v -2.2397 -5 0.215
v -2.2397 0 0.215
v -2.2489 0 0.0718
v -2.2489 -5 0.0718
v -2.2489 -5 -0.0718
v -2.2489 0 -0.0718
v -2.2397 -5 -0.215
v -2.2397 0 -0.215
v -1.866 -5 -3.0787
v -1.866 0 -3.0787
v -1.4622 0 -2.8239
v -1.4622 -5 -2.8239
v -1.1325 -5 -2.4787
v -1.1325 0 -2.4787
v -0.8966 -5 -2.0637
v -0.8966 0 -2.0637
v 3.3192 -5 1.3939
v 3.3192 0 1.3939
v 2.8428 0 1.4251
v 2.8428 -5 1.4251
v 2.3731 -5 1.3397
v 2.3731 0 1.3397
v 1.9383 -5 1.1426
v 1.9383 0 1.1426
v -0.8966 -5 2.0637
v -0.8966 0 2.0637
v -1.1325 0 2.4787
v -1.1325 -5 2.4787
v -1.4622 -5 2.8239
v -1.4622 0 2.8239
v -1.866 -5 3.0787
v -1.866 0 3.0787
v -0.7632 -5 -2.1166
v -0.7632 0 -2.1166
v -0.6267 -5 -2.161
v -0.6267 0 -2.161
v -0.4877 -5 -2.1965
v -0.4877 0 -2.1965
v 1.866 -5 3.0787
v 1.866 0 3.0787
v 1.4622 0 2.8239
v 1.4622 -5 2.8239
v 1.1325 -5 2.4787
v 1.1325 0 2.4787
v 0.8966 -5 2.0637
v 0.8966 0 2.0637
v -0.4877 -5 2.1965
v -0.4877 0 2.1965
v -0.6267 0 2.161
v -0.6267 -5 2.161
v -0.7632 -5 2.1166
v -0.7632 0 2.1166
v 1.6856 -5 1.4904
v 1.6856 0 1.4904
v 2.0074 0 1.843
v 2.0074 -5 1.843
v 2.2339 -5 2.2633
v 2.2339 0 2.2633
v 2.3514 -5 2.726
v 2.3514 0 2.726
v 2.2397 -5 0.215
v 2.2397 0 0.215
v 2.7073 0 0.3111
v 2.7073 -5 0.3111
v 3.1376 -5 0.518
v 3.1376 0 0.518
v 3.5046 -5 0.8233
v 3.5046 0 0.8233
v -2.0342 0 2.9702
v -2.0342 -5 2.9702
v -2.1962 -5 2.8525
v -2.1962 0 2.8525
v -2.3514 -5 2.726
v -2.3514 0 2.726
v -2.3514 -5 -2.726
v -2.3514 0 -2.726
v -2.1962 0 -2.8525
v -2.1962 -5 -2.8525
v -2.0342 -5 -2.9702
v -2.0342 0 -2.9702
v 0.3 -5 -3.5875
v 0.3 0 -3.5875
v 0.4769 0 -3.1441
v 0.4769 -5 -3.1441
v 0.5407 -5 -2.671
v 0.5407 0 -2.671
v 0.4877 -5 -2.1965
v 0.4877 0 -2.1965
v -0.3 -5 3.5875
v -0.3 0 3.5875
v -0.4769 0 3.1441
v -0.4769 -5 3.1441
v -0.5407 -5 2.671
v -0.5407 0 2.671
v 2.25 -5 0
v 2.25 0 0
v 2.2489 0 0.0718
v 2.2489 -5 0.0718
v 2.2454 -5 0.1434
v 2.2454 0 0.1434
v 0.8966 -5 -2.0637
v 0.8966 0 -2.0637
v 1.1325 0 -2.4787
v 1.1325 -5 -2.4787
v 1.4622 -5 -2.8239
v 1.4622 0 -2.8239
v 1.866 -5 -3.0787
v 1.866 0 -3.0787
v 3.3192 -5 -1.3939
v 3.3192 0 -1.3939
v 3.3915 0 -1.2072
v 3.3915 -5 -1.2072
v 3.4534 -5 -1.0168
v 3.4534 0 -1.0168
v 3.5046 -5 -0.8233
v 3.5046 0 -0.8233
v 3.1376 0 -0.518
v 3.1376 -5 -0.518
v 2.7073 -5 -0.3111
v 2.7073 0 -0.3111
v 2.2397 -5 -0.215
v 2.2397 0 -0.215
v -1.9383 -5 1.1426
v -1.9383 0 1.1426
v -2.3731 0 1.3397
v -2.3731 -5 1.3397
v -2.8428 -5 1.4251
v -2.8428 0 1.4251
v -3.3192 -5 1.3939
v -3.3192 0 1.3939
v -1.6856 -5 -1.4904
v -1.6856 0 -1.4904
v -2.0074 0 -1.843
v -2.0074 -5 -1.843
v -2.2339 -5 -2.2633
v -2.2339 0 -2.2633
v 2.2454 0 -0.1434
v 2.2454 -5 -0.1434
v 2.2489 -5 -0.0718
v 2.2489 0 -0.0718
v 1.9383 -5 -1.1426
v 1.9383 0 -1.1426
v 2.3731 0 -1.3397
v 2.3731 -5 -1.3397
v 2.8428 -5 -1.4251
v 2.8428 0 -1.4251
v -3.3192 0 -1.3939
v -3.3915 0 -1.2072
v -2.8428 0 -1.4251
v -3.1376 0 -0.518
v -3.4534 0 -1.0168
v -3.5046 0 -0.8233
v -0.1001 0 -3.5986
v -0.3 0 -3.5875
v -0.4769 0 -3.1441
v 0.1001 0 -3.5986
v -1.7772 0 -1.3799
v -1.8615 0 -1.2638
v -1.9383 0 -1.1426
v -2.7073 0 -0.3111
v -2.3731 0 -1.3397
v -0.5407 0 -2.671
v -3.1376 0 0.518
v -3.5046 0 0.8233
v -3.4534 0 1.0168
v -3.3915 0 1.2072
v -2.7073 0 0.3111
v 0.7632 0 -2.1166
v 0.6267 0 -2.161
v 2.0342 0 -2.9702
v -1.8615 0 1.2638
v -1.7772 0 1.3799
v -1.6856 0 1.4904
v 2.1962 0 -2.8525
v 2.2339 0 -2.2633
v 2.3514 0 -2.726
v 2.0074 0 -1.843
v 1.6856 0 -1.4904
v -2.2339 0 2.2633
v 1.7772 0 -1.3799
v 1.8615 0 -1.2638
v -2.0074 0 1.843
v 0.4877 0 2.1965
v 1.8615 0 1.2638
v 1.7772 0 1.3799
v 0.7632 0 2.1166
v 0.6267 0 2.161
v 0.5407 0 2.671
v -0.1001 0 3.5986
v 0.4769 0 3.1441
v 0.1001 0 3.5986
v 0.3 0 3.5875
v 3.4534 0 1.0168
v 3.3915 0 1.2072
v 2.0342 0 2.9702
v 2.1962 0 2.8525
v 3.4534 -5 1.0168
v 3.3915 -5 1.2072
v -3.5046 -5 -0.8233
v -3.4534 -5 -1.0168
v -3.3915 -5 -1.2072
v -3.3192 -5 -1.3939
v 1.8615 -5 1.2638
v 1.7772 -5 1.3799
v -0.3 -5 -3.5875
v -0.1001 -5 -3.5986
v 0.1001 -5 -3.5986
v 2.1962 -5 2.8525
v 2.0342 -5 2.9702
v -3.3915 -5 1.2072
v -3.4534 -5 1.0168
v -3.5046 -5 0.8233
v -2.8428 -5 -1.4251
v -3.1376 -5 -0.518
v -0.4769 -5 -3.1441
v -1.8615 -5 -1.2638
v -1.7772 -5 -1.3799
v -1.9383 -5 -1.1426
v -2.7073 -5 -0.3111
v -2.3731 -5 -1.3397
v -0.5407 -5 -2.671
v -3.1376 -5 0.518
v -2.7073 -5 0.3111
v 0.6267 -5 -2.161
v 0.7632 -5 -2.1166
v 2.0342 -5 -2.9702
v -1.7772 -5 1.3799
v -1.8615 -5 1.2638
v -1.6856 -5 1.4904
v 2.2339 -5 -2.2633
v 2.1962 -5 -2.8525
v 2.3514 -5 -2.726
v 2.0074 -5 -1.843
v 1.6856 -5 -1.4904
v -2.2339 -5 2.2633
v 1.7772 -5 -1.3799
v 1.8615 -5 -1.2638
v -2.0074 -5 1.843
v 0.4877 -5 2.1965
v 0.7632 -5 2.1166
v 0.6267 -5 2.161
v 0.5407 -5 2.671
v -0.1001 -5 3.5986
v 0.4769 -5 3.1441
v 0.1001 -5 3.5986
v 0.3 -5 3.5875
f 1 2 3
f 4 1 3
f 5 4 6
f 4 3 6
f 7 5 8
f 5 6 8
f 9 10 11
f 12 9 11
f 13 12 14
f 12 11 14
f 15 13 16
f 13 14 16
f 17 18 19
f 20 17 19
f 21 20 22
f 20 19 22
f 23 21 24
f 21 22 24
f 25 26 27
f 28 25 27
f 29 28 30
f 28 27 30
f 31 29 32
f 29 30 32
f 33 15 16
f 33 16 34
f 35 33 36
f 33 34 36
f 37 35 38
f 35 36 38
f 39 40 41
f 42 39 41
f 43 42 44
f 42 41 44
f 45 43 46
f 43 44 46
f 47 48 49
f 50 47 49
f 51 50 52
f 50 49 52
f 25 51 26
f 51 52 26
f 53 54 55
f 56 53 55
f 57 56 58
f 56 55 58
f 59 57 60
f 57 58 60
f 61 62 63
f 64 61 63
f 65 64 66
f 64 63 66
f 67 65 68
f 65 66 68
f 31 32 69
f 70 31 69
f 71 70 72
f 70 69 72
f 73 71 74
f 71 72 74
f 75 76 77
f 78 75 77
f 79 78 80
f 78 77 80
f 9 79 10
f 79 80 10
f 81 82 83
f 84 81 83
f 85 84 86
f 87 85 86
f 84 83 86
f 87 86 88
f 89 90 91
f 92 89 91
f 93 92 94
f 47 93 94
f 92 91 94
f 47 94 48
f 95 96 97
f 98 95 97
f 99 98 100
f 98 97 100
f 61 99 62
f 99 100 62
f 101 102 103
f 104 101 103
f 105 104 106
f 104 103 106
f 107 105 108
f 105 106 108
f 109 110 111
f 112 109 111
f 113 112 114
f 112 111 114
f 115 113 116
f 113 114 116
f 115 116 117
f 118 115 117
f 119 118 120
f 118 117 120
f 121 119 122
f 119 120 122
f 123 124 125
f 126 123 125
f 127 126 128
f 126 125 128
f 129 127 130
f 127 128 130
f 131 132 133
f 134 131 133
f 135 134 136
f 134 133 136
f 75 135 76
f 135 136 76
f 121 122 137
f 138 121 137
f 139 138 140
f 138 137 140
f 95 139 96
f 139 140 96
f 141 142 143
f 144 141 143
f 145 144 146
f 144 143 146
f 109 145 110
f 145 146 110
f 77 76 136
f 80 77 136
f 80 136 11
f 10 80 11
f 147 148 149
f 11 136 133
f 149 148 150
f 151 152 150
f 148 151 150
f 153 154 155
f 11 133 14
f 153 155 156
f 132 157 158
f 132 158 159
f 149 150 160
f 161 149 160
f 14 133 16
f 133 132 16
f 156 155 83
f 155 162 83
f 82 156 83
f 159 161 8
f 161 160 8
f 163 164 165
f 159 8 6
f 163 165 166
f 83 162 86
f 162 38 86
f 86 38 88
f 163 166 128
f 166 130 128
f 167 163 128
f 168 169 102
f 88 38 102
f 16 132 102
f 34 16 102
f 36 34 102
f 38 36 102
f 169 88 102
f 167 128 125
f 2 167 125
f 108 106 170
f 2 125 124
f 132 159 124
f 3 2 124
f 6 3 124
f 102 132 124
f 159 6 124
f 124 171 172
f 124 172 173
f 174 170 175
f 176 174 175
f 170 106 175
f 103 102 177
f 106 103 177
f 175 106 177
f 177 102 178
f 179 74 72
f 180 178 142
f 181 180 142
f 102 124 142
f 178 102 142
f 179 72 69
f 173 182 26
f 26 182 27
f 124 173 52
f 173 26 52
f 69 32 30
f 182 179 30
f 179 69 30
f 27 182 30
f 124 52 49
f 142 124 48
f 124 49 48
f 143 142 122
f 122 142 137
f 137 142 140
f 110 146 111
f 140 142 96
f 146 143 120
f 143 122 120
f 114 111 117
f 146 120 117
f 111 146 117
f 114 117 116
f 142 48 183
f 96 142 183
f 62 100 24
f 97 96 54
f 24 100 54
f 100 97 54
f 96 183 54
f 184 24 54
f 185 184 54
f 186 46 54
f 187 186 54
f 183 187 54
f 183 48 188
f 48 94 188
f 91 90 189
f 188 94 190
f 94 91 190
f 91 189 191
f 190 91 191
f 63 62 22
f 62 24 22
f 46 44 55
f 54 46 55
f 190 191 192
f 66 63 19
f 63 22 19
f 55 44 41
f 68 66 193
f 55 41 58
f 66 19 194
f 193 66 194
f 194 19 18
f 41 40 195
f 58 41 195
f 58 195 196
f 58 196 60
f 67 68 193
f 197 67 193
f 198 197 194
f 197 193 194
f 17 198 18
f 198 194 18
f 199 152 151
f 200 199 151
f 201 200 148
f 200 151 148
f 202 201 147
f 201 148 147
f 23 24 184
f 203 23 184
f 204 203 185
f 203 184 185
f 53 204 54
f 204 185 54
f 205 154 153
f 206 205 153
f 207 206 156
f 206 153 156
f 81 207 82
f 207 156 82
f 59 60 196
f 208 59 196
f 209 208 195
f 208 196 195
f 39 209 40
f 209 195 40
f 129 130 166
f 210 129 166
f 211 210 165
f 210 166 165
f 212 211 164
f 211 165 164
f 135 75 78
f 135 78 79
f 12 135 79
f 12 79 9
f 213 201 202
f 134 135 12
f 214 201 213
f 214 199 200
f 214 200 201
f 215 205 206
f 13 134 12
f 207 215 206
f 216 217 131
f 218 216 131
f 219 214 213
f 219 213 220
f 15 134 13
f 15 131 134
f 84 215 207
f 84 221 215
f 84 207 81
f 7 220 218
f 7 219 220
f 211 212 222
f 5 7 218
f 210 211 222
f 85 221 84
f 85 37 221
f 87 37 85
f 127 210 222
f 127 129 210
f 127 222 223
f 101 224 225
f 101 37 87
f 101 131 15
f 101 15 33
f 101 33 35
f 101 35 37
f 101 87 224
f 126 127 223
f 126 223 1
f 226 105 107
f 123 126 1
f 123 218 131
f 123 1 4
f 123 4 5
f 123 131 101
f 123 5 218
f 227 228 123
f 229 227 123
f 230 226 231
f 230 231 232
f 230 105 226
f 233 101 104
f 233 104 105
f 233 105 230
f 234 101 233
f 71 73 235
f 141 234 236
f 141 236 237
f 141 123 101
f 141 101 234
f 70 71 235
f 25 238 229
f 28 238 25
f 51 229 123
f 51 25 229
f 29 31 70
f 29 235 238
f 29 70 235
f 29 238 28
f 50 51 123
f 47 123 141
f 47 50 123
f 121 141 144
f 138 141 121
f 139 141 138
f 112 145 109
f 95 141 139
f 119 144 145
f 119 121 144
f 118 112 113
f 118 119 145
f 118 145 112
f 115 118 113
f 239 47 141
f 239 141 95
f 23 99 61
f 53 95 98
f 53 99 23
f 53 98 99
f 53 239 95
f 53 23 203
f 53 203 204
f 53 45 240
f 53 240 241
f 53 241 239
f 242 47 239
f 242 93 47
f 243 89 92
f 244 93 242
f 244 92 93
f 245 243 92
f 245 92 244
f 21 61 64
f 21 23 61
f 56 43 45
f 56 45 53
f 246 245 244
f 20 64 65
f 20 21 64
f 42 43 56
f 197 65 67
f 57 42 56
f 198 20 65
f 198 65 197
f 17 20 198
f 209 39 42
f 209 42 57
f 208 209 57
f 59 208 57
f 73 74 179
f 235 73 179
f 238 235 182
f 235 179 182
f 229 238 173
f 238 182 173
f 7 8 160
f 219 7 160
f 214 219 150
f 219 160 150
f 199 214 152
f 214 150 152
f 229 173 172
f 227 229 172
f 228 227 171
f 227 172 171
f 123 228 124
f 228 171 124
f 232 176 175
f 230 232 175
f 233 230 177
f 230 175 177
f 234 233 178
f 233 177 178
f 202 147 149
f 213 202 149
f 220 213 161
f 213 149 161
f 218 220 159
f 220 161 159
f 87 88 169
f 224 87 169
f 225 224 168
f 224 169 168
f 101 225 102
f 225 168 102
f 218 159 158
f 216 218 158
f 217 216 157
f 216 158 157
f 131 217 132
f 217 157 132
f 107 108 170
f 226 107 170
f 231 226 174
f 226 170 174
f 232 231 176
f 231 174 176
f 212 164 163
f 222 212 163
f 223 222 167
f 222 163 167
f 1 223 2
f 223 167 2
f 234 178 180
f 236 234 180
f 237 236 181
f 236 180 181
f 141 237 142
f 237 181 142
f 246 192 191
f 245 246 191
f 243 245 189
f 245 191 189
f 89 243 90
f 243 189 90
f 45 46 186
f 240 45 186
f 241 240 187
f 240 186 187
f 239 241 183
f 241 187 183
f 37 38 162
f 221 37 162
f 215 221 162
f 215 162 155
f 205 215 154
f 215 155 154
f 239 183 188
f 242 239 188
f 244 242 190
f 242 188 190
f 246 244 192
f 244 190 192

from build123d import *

# Parameters (mm, degrees)
F1_DEPTH = 5
F3_DEPTH = 5


with BuildPart() as f1:
    # F0 (on Front) → F1 (new body)
    with BuildSketch(Plane.XZ):
        with BuildLine():
            ThreePointArc((-0.487665, 2.196516), (-1.408058, -1.754957), (2.25, 0))
            ThreePointArc((2.25, 0), (1.754957, 1.408058), (0.487665, 2.196516))
            ThreePointArc((0.487665, 2.196516), (0, 2.25), (-0.487665, 2.196516))
        make_face()
    extrude(amount=F1_DEPTH)

    # F2 (on Front) + F0 (on Front) → F3 (join)
    with BuildSketch(Plane.XZ):
        with BuildLine():
            ThreePointArc((-1.685609, 1.490377), (-1.322517, 1.820288), (-0.896551, 2.063661))
            ThreePointArc((-0.896551, 2.063661), (-1.286731, 2.661442), (-1.865962, 3.078666))
            ThreePointArc((-1.865962, 3.078666), (-2.116027, 2.912461), (-2.351372, 2.725995))
            ThreePointArc((-2.351372, 2.725995), (-2.13356, 2.046185), (-1.685609, 1.490377))
        make_face()
        with BuildLine():
            ThreePointArc((0.896551, 2.063661), (1.322517, 1.820288), (1.685609, 1.490377))
            ThreePointArc((1.685609, 1.490377), (2.13356, 2.046185), (2.351372, 2.725995))
            ThreePointArc((2.351372, 2.725995), (2.116027, 2.912461), (1.865962, 3.078666))
            ThreePointArc((1.865962, 3.078666), (1.286731, 2.661442), (0.896551, 2.063661))
        make_face()
        with BuildLine():
            ThreePointArc((1.938314, 1.142558), (2.139877, 0.695288), (2.239708, 0.214964))
            ThreePointArc((2.239708, 0.214964), (2.928804, 0.401323), (3.5046, 0.823275))
            ThreePointArc((3.5046, 0.823275), (3.423803, 1.112461), (3.319189, 1.393909))
            ThreePointArc((3.319189, 1.393909), (2.605344, 1.39683), (1.938314, 1.142558))
        make_face()
        with BuildLine():
            ThreePointArc((3.5046, -0.823275), (2.928804, -0.401323), (2.239708, -0.214964))
            ThreePointArc((2.239708, -0.214964), (2.139877, -0.695288), (1.938314, -1.142558))
            ThreePointArc((1.938314, -1.142558), (2.605344, -1.39683), (3.319189, -1.393909))
            ThreePointArc((3.319189, -1.393909), (3.423803, -1.112461), (3.5046, -0.823275))
        make_face()
        with BuildLine():
            ThreePointArc((2.351372, -2.725995), (2.13356, -2.046185), (1.685609, -1.490377))
            ThreePointArc((1.685609, -1.490377), (1.322517, -1.820288), (0.896551, -2.063661))
            ThreePointArc((0.896551, -2.063661), (1.286731, -2.661442), (1.865962, -3.078666))
            ThreePointArc((1.865962, -3.078666), (2.116027, -2.912461), (2.351372, -2.725995))
        make_face()
        with BuildLine():
            ThreePointArc((0.3, -3.587478), (0.523369, -2.909474), (0.487665, -2.196516))
            ThreePointArc((0.487665, -2.196516), (0, -2.25), (-0.487665, -2.196516))
            ThreePointArc((-0.487665, -2.196516), (-0.523369, -2.909474), (-0.3, -3.587478))
            ThreePointArc((-0.3, -3.587478), (0, -3.6), (0.3, -3.587478))
        make_face()
        with BuildLine():
            ThreePointArc((-2.239708, 0.214964), (-2.139877, 0.695288), (-1.938314, 1.142558))
            ThreePointArc((-1.938314, 1.142558), (-2.605344, 1.39683), (-3.319189, 1.393909))
            ThreePointArc((-3.319189, 1.393909), (-3.423803, 1.112461), (-3.5046, 0.823275))
            ThreePointArc((-3.5046, 0.823275), (-2.928804, 0.401323), (-2.239708, 0.214964))
        make_face()
        with BuildLine():
            ThreePointArc((-1.865962, -3.078666), (-1.286731, -2.661442), (-0.896551, -2.063661))
            ThreePointArc((-0.896551, -2.063661), (-1.322517, -1.820288), (-1.685609, -1.490377))
            ThreePointArc((-1.685609, -1.490377), (-2.13356, -2.046185), (-2.351372, -2.725995))
            ThreePointArc((-2.351372, -2.725995), (-2.116027, -2.912461), (-1.865962, -3.078666))
        make_face()
        with BuildLine():
            ThreePointArc((-3.319189, -1.393909), (-2.605344, -1.39683), (-1.938314, -1.142558))
            ThreePointArc((-1.938314, -1.142558), (-2.139877, -0.695288), (-2.239708, -0.214964))
            ThreePointArc((-2.239708, -0.214964), (-2.928804, -0.401323), (-3.5046, -0.823275))
            ThreePointArc((-3.5046, -0.823275), (-3.423803, -1.112461), (-3.319189, -1.393909))
        make_face()
    with BuildSketch(Plane.XZ):
        with BuildLine():
            ThreePointArc((-0.487665, 2.196516), (0, 2.25), (0.487665, 2.196516))
            ThreePointArc((0.487665, 2.196516), (0.523369, 2.909474), (0.3, 3.587478))
            ThreePointArc((0.3, 3.587478), (0, 3.6), (-0.3, 3.587478))
            ThreePointArc((-0.3, 3.587478), (-0.523369, 2.909474), (-0.487665, 2.196516))
        make_face()
    extrude(amount=F3_DEPTH)


solid = f1.part
